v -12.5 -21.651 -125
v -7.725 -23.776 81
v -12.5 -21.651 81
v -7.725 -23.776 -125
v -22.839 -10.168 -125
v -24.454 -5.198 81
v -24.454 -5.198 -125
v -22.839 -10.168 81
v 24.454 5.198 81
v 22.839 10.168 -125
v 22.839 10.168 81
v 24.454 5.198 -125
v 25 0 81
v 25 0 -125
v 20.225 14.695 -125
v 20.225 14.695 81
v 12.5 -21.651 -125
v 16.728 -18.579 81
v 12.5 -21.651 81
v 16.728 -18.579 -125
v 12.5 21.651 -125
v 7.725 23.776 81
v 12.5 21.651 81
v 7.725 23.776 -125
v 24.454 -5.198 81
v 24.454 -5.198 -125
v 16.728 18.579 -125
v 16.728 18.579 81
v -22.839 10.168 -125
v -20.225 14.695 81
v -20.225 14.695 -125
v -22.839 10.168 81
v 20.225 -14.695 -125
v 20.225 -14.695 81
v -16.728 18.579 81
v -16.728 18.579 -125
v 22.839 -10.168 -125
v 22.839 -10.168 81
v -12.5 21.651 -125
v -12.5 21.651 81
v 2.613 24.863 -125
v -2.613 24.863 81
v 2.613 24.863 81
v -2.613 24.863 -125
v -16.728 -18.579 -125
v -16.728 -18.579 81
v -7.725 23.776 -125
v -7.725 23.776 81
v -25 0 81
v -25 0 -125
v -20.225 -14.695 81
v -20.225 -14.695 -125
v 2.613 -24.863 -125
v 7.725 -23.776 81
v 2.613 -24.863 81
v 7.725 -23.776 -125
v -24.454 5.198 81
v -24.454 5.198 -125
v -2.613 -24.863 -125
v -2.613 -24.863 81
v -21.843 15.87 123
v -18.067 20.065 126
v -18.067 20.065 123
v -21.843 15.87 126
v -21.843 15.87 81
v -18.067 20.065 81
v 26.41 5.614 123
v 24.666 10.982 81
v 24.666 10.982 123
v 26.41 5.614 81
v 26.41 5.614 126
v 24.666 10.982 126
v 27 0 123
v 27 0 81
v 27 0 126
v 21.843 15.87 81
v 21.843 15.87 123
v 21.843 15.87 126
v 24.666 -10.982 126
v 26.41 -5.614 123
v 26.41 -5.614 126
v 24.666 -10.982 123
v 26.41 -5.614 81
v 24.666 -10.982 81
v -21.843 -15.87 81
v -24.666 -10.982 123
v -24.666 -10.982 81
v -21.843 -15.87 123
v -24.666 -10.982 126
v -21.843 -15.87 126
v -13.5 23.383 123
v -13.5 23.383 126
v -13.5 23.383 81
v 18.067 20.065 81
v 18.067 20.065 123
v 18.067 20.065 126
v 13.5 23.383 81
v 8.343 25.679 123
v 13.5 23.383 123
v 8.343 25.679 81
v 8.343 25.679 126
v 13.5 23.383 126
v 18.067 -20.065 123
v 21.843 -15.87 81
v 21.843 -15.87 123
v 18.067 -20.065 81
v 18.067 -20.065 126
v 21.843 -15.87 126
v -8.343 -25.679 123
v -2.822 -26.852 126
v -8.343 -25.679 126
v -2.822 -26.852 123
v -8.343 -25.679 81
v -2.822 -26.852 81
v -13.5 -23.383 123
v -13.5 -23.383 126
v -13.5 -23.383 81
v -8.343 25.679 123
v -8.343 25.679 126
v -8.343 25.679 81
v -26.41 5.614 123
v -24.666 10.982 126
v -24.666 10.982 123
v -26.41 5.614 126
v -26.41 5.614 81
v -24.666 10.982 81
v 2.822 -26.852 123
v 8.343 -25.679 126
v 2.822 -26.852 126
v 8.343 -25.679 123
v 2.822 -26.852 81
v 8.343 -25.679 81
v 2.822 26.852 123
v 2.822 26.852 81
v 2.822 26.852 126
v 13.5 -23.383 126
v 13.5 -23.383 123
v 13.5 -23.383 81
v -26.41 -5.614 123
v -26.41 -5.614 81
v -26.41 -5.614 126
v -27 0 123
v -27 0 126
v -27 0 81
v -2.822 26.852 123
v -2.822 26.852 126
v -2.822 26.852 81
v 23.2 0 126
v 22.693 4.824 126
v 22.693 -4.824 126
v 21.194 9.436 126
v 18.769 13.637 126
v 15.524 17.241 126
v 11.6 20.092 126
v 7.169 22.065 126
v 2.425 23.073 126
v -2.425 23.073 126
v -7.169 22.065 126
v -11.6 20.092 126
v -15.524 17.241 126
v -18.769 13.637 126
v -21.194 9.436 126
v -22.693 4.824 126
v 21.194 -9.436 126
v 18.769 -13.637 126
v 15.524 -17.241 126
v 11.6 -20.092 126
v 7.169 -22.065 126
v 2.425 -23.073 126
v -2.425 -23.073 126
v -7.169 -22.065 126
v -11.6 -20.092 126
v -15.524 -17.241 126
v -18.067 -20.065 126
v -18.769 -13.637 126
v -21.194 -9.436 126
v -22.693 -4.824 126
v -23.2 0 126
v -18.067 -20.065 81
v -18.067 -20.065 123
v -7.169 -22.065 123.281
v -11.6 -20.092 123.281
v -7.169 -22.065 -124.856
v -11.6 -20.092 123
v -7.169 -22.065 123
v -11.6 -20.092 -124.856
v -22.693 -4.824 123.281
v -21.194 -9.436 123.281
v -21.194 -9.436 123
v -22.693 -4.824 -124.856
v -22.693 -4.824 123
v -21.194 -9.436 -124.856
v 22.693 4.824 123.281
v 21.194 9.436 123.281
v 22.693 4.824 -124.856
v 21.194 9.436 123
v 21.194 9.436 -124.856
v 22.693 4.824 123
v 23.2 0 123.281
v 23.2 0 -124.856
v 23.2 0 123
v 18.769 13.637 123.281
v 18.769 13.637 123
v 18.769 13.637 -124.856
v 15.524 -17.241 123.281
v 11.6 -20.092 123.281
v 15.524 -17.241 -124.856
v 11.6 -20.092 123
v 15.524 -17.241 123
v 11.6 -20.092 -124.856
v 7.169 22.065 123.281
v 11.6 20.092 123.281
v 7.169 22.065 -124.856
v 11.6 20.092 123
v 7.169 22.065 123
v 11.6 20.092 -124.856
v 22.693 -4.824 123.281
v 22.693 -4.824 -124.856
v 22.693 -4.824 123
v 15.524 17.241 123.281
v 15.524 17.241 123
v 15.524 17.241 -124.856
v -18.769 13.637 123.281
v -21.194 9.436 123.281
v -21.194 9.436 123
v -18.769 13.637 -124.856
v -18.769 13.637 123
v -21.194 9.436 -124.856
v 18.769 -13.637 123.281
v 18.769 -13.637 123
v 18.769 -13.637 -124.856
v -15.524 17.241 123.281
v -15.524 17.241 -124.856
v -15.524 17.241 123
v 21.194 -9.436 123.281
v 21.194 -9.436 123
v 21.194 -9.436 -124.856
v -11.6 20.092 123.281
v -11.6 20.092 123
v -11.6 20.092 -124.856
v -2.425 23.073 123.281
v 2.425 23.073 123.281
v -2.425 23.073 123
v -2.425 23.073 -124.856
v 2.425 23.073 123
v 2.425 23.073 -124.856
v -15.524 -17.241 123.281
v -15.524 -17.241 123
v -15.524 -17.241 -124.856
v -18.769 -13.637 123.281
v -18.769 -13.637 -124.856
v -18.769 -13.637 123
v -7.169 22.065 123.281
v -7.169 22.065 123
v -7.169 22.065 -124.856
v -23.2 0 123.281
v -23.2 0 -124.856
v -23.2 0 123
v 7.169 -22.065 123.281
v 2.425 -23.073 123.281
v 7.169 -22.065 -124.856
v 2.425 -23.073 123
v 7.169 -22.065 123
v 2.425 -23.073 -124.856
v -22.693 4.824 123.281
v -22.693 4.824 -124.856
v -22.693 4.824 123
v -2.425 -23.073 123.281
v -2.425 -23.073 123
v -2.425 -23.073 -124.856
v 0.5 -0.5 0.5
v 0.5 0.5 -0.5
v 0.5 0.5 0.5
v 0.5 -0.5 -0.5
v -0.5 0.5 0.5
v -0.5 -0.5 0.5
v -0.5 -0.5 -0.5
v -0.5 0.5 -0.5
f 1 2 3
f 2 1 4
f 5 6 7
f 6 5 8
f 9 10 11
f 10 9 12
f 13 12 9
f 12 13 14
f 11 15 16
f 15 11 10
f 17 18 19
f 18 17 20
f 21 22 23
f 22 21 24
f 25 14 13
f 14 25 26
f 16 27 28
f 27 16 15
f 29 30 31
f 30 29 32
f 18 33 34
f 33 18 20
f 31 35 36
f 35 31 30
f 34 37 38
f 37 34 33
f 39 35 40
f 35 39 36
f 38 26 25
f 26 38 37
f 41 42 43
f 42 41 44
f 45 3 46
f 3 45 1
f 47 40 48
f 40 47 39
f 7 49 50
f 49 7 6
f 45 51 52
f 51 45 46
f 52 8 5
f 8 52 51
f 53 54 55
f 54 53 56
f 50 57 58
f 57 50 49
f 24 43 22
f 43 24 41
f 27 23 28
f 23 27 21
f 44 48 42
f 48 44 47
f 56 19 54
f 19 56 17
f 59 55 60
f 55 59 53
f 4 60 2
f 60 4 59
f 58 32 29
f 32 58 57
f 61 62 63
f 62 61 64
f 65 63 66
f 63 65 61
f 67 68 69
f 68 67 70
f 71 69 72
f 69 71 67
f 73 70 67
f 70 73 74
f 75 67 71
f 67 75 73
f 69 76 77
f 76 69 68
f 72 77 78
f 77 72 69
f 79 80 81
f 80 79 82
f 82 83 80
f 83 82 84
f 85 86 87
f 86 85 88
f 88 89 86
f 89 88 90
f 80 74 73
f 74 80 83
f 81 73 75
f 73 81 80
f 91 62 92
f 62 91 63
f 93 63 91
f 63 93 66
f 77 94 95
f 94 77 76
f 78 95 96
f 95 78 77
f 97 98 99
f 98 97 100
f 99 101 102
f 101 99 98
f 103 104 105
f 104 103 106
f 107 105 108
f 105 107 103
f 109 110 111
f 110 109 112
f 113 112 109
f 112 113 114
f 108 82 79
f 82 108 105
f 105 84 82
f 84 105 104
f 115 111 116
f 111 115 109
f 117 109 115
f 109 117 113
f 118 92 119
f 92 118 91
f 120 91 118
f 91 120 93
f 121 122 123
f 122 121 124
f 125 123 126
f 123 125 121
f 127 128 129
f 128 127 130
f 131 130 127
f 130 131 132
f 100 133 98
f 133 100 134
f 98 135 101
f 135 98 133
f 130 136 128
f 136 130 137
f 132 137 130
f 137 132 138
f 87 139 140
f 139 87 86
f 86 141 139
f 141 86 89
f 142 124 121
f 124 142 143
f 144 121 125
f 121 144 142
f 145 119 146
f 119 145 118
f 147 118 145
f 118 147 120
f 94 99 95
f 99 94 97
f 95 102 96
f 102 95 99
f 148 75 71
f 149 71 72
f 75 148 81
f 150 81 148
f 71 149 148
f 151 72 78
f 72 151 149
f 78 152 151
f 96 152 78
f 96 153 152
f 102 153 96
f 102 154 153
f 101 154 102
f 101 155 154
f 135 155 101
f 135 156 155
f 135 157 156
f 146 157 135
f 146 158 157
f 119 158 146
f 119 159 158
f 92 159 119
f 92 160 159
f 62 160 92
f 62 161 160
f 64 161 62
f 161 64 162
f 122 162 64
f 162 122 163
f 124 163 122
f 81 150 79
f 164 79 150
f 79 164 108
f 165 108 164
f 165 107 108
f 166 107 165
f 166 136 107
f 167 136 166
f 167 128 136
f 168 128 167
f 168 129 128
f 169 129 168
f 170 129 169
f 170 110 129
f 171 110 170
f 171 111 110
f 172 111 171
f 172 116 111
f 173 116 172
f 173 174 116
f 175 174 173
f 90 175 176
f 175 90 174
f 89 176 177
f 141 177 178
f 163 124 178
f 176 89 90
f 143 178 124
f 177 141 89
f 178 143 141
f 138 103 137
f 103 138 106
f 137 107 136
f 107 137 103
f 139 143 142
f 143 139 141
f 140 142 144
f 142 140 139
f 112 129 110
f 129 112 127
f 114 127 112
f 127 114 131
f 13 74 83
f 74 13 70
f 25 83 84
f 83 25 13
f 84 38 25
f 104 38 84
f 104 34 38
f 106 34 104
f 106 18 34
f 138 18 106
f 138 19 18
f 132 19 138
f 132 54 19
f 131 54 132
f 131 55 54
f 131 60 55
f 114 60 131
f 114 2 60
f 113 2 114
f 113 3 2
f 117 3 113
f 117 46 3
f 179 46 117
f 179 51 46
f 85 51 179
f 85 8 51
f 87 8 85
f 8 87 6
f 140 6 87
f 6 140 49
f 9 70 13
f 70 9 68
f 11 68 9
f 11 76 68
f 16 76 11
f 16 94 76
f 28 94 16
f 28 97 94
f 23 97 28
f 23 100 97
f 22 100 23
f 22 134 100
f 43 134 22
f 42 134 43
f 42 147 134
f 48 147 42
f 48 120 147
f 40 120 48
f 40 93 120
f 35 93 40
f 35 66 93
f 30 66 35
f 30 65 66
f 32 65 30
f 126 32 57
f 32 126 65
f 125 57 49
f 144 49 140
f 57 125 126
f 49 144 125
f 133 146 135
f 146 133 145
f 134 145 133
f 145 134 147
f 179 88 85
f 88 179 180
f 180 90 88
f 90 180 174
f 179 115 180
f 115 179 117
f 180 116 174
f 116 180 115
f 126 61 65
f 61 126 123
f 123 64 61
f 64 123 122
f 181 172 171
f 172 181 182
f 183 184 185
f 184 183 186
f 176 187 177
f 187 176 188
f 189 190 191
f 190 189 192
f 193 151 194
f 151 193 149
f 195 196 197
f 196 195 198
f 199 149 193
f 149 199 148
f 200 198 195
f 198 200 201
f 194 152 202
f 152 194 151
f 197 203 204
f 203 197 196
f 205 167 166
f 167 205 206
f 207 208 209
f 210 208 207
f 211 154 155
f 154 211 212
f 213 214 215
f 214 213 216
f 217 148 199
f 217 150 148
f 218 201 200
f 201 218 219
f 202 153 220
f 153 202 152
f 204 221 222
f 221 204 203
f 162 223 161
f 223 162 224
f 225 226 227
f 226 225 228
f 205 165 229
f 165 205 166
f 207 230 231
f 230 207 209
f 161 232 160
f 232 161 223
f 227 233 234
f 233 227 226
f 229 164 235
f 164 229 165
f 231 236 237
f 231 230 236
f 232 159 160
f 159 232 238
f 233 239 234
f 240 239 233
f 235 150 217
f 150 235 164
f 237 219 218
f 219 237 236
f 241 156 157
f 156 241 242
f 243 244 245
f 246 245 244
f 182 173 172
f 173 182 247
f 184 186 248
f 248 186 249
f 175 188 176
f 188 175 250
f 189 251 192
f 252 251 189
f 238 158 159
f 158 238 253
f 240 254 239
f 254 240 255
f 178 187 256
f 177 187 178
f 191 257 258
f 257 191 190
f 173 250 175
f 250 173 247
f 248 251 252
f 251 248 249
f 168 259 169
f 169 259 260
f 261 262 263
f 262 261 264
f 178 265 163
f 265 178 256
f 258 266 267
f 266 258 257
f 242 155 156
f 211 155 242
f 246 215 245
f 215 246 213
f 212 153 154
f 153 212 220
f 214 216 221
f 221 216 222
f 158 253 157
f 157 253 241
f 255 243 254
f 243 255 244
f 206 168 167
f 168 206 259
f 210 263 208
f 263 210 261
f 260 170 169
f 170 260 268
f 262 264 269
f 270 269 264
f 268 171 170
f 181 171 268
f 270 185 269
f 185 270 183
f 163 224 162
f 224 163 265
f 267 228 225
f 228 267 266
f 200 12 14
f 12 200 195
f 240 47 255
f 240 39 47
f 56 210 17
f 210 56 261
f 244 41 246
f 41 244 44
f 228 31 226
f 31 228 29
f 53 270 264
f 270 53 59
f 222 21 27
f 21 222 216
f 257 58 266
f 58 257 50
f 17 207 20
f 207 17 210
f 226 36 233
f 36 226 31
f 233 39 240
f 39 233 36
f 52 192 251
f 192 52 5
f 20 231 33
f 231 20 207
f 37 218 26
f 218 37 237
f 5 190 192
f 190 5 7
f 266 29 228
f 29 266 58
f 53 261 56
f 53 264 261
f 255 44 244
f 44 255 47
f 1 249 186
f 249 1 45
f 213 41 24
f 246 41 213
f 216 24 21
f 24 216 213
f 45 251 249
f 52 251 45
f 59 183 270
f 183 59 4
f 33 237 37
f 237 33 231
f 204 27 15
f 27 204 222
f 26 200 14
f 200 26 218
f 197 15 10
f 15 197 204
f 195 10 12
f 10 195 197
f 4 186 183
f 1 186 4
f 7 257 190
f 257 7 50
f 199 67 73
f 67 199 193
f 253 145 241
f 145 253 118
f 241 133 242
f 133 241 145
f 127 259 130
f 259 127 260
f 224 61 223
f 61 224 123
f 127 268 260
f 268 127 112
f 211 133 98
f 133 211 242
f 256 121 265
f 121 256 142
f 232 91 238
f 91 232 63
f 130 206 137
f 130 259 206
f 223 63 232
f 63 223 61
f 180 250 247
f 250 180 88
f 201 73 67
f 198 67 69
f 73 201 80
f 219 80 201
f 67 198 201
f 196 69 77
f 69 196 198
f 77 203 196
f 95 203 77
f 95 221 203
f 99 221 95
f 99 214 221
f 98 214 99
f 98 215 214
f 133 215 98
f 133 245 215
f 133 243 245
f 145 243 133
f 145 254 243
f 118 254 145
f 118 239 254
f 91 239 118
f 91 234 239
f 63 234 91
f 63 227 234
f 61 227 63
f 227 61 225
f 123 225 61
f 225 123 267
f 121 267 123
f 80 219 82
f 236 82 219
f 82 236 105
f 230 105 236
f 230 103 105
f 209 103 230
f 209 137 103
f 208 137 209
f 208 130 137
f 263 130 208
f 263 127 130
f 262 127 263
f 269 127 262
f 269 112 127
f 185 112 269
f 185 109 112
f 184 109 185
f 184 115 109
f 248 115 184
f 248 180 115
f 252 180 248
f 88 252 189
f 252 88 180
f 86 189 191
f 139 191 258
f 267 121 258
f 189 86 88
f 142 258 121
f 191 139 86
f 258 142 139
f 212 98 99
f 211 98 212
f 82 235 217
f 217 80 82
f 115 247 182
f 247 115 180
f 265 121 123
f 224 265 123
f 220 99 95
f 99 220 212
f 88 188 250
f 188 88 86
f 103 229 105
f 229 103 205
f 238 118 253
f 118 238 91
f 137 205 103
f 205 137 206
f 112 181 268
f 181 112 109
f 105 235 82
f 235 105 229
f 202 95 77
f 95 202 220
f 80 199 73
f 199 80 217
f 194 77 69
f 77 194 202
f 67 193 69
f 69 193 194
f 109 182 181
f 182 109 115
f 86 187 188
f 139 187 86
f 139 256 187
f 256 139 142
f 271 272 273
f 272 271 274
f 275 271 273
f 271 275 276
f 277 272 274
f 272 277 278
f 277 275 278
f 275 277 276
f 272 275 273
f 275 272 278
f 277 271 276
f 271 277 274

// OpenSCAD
// Parameters
pipe_length = 250; //[125:500:1]
outer_diameter = 50; //[25:100:1]
wall_thickness = 1.8; //[0.9:3.6:0.1]
socket_length = 45; //[25:90:1]
socket_wall_extra = 1.2; //[0.6:2.4:0.1]
socket_od_extra = 4; //[2:8:0.5]
chamfer_length = 2; //[1:6:0.5]
overlap = 1; //[0.5:2:0.1]

// Base Shapes
module pipe_body() {
  translate([0, 0, 0])
    cylinder(h=pipe_length, r=outer_diameter/2, center=true);
}

module inner_bore() {
  translate([0, 0, 0])
    cylinder(h=pipe_length + 2*overlap, r=outer_diameter/2 - wall_thickness, center=true);
}

module socket_end() {
  translate([0, 0, pipe_length/2 - socket_length/2 + overlap])
    cylinder(h=socket_length, r=outer_diameter/2 + socket_od_extra/2, center=true);
}

module socket_inner_bore() {
  translate([0, 0, pipe_length/2 - socket_length/2 + overlap])
    cylinder(h=socket_length + 2*overlap, r=outer_diameter/2 - wall_thickness - socket_wall_extra, center=true);
}

module chamfer_spigot_outer() {
  translate([0, 0, -pipe_length/2 + chamfer_length/2])
    cylinder(h=chamfer_length, r1=outer_diameter/2, r2=0, center=true);
}

module chamfer_spigot_inner() {
  translate([0, 0, -pipe_length/2 + chamfer_length/2])
    cylinder(h=chamfer_length, r1=outer_diameter/2 - wall_thickness, r2=0, center=true);
}

module chamfer_socket_outer() {
  translate([0, 0, pipe_length/2 - chamfer_length/2])
    cylinder(h=chamfer_length, r1=outer_diameter/2 + socket_od_extra/2, r2=0, center=true);
}

module chamfer_socket_inner() {
  translate([0, 0, pipe_length/2 - chamfer_length/2])
    cylinder(h=chamfer_length, r1=outer_diameter/2 - wall_thickness - socket_wall_extra, r2=0, center=true);
}

module markings_text() {
  translate([0, 0, 0])
    cube([overlap, overlap, overlap], center=true);
}

// Operations
module outer_union() {
  union() {
    pipe_body();
    socket_end();
  }
}

module bore_union() {
  union() {
    inner_bore();
    socket_inner_bore();
  }
}

module chamfers_union() {
  union() {
    chamfer_spigot_outer();
    chamfer_spigot_inner();
    chamfer_socket_outer();
    chamfer_socket_inner();
  }
}

module pipe_hollowed() {
  difference() {
    outer_union();
    bore_union();
  }
}

module pipe_with_chamfers() {
  difference() {
    pipe_hollowed();
    chamfers_union();
  }
}

// Final Model
module final_model() {
  union() {
    pipe_with_chamfers();
    markings_text();
  }
}

// Render the final model
final_model();
